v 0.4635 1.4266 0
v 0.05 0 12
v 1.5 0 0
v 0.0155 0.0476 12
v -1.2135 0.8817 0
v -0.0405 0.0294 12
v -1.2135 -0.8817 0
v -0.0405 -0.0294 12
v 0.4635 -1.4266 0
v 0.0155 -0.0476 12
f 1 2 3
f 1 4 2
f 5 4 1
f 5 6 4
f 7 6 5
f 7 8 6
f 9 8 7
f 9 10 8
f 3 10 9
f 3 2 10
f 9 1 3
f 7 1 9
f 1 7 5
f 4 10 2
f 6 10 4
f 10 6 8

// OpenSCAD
// tip_family.scad
// Units: mm. One file that can generate multiple tip families.

// ----- parameters passed via -D -----
shape = is_undef(shape) ? "solid_cone" : shape;
// Common
L = is_undef(L) ? 12 : L;
D = is_undef(D) ? 3  : D;     // outer diameter
$fn = is_undef($fn) ? 96 : $fn;

// For hollows / bluntness
wall = is_undef(wall) ? 0.4 : wall;     // wall thickness for hollow cone
tipR = is_undef(tipR) ? 0.6 : tipR;      // tip radius for blunt cone

// For ellipsoid
a = is_undef(a) ? (D/2) : a;  // semi-axis x
b = is_undef(b) ? (D/2) : b;  // semi-axis y
c = is_undef(c) ? (L)   : c;  // semi-axis z (height)

// ----- helpers -----
module solid_cone(L, D){
    cylinder(h=L, r1=D/2, r2=0.05);
}

module hollow_cone(L, D, wall){
    // Outer frustum (flat top) minus inner frustum
    // Keep a small top radius so subtraction doesn't create degeneracy
    r1o = D/2;
    r2o = max(0.3, 0.25*r1o);
    r1i = max(0.01, r1o - wall);
    r2i = max(0.01, r2o - wall);

    difference(){
        cylinder(h=L, r1=r1o, r2=r2o);
        translate([0,0,wall]) cylinder(h=max(0.01, L-wall), r1=r1i, r2=r2i);
    }
}

module rod(L, D){
    cylinder(h=L, r=D/2);
}

module hemisphere(D){
    r = D/2;
    intersection(){
        sphere(r=r);
        translate([-2*r,-2*r,0]) cube([4*r,4*r,2*r]);
    }
}

module half_ellipsoid(a,b,c){
    // Scale a sphere to ellipsoid then cut in half (z>=0)
    intersection(){
        scale([a,b,c]) sphere(r=1);
        translate([-2*a,-2*b,0]) cube([4*a,4*b,2*c]);
    }
}

module blunt_cone(L, D, tipR){
    // Rounded/blunt cone using Minkowski sum
    // NOTE: OpenSCAD cannot assign geometry to a variable; must inline primitives.
    minkowski(){
        cylinder(h=max(0.01, L-tipR), r1=D/2, r2=max(0.05, tipR));
        sphere(r=tipR);
    }
}

// ----- main switch -----
if (shape == "solid_cone")
    solid_cone(L,D);
else if (shape == "hollow_cone")
    hollow_cone(L,D,wall);
else if (shape == "rod")
    rod(L,D);
else if (shape == "hemisphere")
    hemisphere(D);
else if (shape == "half_ellipsoid")
    half_ellipsoid(a,b,c);
else if (shape == "blunt_cone")
    blunt_cone(L,D,tipR);
else
    solid_cone(L,D); // fallback
